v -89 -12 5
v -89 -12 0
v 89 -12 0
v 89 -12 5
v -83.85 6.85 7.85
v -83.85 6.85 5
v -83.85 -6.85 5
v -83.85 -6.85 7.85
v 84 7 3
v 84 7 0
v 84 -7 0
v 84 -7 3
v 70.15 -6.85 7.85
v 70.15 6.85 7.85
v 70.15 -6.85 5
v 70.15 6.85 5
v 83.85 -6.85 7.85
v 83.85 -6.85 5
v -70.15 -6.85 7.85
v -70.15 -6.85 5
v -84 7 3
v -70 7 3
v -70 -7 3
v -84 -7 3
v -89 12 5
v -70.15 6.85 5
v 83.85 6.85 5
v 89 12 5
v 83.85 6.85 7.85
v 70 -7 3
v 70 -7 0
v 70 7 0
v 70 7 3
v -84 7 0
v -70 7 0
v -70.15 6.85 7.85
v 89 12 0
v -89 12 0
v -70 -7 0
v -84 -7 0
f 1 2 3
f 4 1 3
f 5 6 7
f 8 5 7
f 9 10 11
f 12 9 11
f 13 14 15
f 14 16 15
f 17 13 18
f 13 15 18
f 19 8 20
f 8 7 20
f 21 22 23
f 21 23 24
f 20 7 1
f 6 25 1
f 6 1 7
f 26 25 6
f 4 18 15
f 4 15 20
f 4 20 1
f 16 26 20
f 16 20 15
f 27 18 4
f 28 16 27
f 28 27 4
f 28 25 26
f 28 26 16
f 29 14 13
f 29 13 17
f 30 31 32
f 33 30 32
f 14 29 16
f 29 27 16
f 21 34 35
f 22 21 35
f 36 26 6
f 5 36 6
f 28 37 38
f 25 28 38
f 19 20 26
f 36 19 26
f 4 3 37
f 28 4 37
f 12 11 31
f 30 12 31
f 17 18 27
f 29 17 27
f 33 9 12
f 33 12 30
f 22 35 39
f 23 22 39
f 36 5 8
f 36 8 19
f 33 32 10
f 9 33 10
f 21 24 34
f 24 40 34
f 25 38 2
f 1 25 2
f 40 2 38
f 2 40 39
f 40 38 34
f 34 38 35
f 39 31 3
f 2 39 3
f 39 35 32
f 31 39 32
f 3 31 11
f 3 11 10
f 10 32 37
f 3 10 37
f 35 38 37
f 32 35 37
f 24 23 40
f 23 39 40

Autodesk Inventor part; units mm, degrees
ref_plane "YZ Plane" through (0, 0, 0) normal (1, 0, 0) x (0, 1, 0)
ref_plane "XZ Plane" through (0, 0, 0) normal (0, 1, 0) x (-1, 0, 0)
ref_plane "XY Plane" through (0, 0, 0) normal (0, 0, 1) x (1, 0, 0)
sketch "Skizze1" plane through (0, 0, 0) normal (0, 0, 1) x (1, 0, 0)
  line L0 (-89, -12) -> (89, -12)
  line L1 (89, -12) -> (89, 12)
  line L2 (89, 12) -> (-89, 12)
  line L3 (-89, 12) -> (-89, -12)
  line L4 (-89, -12) -> (89, 12) construction
  line L5 (89, -12) -> (-89, 12) construction
  line L6 (65, 12) -> (65, -12)
  line L7 (-65, 12) -> (-65, -12)
  line L8 (-89, 12) -> (-65, -12) construction
  line L9 (-65, 12) -> (-89, -12) construction
  line L10 (89, 12) -> (65, -12) construction
  line L11 (65, 12) -> (89, -12) construction
  point P0 (0, 0)
  dimension "d0" = 178
  dimension "d1" = 24
  dimension "d2" = 24
  dimension "d3" = 24
extrude "Extrusion1" add sketch "Skizze1" along normal blind 5
sketch "Skizze3" plane through (0, 0, 5) normal (0, 0, 1) x (1, 0, 0)
  line L0 (-89, -12) -> (89, -12)
  line L1 (89, -12) -> (89, 12)
  line L2 (89, 12) -> (-89, 12)
  line L3 (-89, 12) -> (-89, -12)
  line L4 (-89, -12) -> (89, 12) construction
  line L5 (89, -12) -> (-89, 12) construction
  line L6 (65, 12) -> (65, -12)
  line L7 (-65, 12) -> (-65, -12)
  line L8 (-89, 12) -> (-65, -12) construction
  line L9 (-65, 12) -> (-89, -12) construction
  line L10 (89, 12) -> (65, -12) construction
  line L11 (65, 12) -> (89, -12) construction
  line L12 (70.15, -6.85) -> (83.85, -6.85)
  line L13 (83.85, -6.85) -> (83.85, 6.85)
  line L14 (83.85, 6.85) -> (70.15, 6.85)
  line L15 (70.15, 6.85) -> (70.15, -6.85)
  line L16 (70.15, -6.85) -> (83.85, 6.85) construction
  line L17 (83.85, -6.85) -> (70.15, 6.85) construction
  line L18 (-83.85, -6.85) -> (-70.15, -6.85)
  line L19 (-70.15, -6.85) -> (-70.15, 6.85)
  line L20 (-70.15, 6.85) -> (-83.85, 6.85)
  line L21 (-83.85, 6.85) -> (-83.85, -6.85)
  line L22 (-83.85, -6.85) -> (-70.15, 6.85) construction
  line L23 (-70.15, -6.85) -> (-83.85, 6.85) construction
  point P0 (0, 0)
  point P1 (0, 0)
  point P2 (77, 0)
  point P3 (-77, 0)
  dimension "d10" = 178
  dimension "d11" = 24
  dimension "d12" = 24
  dimension "d13" = 24
  dimension "d14" = 13.7
  dimension "d15" = 13.7
extrude "Extrusion2" add sketch "Skizze3" along normal blind 2.85 contours L15 L14 L13 L12 | L21 L20 L19 L18
sketch "Skizze4" plane through (0, 0, 0) normal (0, 0, -1) x (-1, 0, 0)
  line L0 (-89, -12) -> (89, -12)
  line L1 (89, -12) -> (89, 12)
  line L2 (89, 12) -> (-89, 12)
  line L3 (-89, 12) -> (-89, -12)
  line L4 (-89, -12) -> (89, 12) construction
  line L5 (89, -12) -> (-89, 12) construction
  line L6 (65, 12) -> (65, -12)
  line L7 (-65, 12) -> (-65, -12)
  line L8 (-89, 12) -> (-65, -12) construction
  line L9 (-65, 12) -> (-89, -12) construction
  line L10 (89, 12) -> (65, -12) construction
  line L11 (65, 12) -> (89, -12) construction
  line L12 (70, -7) -> (84, -7)
  line L13 (84, -7) -> (84, 7)
  line L14 (84, 7) -> (70, 7)
  line L15 (70, 7) -> (70, -7)
  line L16 (70, -7) -> (84, 7) construction
  line L17 (84, -7) -> (70, 7) construction
  line L18 (-84, -7) -> (-70, -7)
  line L19 (-70, -7) -> (-70, 7)
  line L20 (-70, 7) -> (-84, 7)
  line L21 (-84, 7) -> (-84, -7)
  line L22 (-84, -7) -> (-70, 7) construction
  line L23 (-70, -7) -> (-84, 7) construction
  point P0 (0, 0)
  point P1 (0, 0)
  point P2 (0, 0)
  point P3 (77, 0)
  point P4 (-77, 0)
  dimension "d18" = 178
  dimension "d19" = 24
  dimension "d20" = 24
  dimension "d21" = 24
  dimension "d22" = 14
  dimension "d23" = 14
extrude "Extrusion3" cut sketch "Skizze4" against normal blind 3 contours L15 L14 L13 L12 | L21 L20 L19 L18
properties part number "20210330_Stabilisator_Korpus" material "Acetal Resin, Black"
